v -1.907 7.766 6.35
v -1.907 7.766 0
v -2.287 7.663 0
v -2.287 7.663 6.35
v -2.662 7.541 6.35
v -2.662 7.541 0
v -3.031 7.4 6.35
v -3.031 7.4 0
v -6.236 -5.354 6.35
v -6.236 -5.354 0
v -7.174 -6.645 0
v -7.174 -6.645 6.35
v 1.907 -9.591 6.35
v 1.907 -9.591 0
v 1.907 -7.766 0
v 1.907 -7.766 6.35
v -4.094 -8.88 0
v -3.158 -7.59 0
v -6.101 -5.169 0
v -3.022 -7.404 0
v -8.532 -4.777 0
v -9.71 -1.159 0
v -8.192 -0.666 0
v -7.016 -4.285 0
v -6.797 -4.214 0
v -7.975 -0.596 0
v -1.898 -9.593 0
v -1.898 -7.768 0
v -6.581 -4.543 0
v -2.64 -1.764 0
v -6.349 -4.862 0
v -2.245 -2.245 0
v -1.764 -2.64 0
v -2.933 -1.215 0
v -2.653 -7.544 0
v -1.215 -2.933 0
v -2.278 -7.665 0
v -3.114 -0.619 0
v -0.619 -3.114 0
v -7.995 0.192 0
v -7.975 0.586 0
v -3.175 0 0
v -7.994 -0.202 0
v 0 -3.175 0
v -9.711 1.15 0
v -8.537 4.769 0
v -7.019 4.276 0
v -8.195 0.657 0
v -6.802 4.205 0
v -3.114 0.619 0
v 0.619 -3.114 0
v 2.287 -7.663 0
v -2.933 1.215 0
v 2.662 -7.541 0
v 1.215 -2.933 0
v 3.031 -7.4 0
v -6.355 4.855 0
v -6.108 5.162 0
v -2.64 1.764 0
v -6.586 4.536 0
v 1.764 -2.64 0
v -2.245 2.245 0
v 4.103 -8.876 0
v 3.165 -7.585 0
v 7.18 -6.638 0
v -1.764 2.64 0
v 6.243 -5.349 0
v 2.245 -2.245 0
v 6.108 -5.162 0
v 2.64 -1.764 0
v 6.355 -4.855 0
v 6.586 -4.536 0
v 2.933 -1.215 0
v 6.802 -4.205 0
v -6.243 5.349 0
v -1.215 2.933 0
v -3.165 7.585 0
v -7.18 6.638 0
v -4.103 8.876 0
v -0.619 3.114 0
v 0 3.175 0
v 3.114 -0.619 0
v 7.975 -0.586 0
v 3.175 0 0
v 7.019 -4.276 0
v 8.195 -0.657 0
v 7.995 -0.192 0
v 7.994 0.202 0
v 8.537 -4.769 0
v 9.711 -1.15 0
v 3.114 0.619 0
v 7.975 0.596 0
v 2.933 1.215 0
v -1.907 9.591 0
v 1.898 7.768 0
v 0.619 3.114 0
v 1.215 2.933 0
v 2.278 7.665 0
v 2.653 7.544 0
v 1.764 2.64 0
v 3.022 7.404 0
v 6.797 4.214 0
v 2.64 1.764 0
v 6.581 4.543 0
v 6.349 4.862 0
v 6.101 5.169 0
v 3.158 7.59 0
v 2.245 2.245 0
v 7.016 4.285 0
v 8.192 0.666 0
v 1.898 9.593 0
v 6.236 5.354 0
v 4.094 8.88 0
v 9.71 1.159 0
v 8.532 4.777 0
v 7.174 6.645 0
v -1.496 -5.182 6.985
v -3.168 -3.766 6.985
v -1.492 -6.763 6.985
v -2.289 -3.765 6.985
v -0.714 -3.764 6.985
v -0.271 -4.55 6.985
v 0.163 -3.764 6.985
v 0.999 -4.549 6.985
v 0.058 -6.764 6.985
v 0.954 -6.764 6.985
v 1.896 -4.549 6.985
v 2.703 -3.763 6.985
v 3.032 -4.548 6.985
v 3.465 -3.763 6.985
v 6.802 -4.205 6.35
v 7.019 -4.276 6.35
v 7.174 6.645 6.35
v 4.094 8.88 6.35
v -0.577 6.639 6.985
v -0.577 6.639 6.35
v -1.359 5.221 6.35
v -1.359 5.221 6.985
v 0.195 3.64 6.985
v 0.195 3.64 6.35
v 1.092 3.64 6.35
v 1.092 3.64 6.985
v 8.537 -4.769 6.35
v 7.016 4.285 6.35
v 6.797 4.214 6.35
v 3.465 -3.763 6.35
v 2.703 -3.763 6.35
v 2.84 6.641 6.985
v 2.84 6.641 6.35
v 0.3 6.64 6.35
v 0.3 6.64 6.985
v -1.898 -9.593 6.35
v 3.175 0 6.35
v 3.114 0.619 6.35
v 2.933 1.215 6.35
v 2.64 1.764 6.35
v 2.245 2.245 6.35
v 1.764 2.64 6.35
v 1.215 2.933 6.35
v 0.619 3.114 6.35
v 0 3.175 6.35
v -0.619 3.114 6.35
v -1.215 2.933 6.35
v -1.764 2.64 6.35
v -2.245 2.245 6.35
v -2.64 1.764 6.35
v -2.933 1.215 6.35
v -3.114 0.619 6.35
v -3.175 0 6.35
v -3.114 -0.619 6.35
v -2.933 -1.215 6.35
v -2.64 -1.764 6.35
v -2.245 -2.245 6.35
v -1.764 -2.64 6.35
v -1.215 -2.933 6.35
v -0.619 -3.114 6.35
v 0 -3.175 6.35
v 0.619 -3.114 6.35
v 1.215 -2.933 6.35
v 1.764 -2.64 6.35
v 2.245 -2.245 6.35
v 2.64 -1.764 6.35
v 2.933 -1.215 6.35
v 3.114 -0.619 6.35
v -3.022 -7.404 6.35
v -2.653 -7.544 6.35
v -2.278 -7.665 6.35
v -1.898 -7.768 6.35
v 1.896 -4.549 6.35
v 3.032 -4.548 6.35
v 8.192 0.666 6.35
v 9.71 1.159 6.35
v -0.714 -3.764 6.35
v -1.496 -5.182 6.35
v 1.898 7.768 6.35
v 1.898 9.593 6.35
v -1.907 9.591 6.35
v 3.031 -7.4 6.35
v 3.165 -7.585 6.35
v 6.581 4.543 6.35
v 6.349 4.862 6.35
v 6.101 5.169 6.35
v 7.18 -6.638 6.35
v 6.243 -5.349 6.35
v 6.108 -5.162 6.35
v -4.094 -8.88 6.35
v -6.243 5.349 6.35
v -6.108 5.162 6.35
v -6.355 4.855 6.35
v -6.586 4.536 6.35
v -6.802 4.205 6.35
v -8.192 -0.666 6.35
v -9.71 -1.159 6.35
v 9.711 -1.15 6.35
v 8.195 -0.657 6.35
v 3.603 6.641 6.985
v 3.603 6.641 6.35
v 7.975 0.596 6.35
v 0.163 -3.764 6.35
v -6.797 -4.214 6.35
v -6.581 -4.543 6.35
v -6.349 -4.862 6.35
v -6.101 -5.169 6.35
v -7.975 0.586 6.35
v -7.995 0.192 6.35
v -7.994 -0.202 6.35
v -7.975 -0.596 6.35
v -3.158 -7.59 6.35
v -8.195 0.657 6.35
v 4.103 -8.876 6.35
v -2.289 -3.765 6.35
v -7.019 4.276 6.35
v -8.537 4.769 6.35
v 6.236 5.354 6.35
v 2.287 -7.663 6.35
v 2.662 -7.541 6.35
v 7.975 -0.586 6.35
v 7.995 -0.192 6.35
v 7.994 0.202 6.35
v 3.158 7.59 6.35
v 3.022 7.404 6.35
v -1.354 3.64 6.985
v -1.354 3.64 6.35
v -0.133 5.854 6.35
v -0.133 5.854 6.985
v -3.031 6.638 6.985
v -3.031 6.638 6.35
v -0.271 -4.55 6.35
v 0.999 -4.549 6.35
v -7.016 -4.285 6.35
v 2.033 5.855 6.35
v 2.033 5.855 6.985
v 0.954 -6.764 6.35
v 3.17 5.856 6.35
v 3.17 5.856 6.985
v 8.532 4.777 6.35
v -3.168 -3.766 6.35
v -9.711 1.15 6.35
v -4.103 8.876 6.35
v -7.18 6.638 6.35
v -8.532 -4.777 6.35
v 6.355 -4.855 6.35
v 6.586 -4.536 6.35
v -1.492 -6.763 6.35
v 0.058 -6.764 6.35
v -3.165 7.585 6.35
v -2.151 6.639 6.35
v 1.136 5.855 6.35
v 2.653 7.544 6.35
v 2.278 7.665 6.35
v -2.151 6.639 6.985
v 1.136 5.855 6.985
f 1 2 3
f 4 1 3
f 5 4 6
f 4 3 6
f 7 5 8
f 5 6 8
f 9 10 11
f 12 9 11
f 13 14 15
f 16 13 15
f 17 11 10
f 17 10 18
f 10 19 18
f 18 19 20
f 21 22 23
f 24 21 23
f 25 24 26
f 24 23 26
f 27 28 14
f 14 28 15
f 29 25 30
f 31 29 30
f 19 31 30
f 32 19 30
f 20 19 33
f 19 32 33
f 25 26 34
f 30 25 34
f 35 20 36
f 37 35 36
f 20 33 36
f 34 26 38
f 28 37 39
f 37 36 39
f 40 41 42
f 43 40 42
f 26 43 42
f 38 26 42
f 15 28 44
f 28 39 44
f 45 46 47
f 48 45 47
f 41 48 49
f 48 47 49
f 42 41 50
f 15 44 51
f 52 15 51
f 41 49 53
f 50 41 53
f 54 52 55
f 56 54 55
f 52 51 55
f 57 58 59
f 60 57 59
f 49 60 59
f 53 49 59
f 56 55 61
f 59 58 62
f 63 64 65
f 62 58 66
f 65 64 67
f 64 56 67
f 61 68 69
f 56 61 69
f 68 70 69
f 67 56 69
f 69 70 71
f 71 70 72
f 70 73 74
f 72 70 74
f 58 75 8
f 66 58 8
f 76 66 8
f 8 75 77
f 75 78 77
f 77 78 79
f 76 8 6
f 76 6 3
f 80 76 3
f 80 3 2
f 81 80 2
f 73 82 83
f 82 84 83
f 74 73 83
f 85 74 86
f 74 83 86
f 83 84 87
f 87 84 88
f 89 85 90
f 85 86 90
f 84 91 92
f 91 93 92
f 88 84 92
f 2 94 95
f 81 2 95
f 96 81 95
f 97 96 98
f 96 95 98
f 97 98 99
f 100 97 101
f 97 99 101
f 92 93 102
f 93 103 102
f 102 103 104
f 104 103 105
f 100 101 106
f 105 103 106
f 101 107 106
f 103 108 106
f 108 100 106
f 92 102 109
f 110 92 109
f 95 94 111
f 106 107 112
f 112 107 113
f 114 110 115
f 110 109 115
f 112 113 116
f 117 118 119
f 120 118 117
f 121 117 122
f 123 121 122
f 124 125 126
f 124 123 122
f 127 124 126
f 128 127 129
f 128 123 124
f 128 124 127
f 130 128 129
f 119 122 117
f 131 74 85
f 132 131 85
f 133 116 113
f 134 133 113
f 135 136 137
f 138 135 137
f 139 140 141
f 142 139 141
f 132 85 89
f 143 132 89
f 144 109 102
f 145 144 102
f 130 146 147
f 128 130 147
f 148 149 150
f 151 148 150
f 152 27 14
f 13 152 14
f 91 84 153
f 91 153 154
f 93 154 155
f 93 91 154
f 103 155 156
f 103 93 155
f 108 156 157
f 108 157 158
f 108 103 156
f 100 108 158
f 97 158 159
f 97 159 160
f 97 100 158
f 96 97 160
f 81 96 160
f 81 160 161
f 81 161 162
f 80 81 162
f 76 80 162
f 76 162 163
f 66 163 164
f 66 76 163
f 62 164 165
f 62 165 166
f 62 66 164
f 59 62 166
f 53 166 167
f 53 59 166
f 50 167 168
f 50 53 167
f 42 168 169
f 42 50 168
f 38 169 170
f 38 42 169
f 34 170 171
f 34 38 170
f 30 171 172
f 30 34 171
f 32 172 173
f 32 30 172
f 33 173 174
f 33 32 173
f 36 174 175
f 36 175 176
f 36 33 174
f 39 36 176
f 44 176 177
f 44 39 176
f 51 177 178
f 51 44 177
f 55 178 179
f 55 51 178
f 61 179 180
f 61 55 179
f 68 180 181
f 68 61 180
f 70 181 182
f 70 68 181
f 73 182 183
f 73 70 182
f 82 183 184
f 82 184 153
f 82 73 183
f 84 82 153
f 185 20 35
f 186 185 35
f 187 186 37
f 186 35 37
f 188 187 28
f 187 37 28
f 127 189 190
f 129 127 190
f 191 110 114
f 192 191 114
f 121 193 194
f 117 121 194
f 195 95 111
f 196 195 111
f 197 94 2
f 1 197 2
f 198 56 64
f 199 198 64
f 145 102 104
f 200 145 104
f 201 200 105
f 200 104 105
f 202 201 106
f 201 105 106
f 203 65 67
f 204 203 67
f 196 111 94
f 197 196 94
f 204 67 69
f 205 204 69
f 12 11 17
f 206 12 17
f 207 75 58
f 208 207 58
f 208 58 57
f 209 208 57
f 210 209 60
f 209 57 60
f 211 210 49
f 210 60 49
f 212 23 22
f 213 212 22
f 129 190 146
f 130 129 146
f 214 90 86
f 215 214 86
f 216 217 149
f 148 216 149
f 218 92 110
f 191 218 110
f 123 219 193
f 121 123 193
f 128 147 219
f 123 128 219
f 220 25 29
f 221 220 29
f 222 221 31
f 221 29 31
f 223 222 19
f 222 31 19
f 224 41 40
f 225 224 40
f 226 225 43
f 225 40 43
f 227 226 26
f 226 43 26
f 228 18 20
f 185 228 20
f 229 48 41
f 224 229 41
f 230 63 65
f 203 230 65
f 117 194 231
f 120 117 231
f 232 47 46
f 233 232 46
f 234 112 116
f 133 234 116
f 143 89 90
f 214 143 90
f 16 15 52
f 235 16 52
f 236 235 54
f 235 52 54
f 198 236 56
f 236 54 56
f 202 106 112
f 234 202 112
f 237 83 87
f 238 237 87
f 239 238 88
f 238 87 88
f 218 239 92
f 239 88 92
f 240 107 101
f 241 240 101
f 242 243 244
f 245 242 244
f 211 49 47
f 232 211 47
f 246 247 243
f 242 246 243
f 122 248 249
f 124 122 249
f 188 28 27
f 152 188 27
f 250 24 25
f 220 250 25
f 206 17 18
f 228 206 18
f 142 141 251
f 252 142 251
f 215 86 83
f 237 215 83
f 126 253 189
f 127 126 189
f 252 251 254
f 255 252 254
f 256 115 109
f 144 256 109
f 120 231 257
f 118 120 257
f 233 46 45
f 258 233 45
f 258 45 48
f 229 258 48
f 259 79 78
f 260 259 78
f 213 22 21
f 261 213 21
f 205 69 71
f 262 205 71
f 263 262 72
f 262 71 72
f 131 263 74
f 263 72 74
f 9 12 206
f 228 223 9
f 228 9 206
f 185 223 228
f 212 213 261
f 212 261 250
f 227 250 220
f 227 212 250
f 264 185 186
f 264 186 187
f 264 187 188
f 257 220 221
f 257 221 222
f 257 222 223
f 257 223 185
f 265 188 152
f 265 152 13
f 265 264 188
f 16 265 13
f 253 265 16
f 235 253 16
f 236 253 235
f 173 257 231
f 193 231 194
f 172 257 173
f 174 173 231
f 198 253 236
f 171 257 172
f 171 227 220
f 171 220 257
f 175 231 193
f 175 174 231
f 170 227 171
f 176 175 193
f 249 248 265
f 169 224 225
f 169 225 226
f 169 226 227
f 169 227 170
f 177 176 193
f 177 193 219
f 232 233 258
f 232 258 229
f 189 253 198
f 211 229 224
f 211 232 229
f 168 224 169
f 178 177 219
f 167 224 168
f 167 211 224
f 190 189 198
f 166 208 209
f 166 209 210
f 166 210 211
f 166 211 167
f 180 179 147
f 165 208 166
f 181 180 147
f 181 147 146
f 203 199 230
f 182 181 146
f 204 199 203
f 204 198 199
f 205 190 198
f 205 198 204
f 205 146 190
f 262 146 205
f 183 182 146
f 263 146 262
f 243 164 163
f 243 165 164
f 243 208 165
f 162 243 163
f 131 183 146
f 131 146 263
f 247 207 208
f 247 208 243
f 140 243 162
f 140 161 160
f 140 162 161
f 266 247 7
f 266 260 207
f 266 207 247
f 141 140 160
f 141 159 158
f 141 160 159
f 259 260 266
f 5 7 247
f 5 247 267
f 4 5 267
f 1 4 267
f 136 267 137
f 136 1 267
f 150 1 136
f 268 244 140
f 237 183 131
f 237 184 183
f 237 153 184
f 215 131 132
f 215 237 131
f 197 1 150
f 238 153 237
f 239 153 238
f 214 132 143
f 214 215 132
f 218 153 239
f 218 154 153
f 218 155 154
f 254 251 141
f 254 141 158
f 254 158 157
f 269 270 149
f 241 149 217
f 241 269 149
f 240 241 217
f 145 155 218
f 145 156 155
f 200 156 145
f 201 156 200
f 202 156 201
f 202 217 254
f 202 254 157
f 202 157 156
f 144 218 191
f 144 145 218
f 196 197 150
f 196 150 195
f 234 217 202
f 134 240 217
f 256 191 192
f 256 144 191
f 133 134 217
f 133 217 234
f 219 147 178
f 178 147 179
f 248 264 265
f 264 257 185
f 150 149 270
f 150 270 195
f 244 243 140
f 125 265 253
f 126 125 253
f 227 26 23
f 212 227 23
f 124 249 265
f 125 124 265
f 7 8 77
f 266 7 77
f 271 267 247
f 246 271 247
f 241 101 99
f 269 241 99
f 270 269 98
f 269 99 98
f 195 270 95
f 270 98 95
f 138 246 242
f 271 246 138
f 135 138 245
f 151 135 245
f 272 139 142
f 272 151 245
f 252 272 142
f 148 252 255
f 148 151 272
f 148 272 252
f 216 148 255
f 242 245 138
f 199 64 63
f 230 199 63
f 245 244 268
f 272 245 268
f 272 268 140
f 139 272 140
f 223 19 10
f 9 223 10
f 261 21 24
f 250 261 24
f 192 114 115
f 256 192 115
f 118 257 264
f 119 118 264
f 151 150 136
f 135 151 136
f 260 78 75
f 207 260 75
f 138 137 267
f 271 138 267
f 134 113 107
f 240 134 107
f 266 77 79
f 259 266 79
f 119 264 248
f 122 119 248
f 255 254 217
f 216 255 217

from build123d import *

# Parameters (mm, degrees)
F0_R     = 3.175
F1_DEPTH = 6.35
F3_DEPTH = 0.635


with BuildPart() as f1:
    # F0 (on Top) → F1 (new body)
    with BuildSketch(Plane.XY):
        with BuildLine():
            Line((-6.243237, 5.348631), (-6.107624, 5.161976))
            ThreePointArc((-6.107624, 5.161976), (-6.472362, 4.696551), (-6.801712, 4.205447))
            Line((-6.801712, 4.205447), (-7.01898, 4.276041))
            Line((-7.01898, 4.276041), (-8.536659, 4.769165))
            Line((-8.536659, 4.769165), (-9.710663, 1.150007))
            Line((-9.710663, 1.150007), (-8.194731, 0.657451))
            Line((-8.194731, 0.657451), (-7.975305, 0.586155))
            ThreePointArc((-7.975305, 0.586155), (-7.996815, -0.004769), (-7.9746, -0.595668))
            Line((-7.9746, -0.595668), (-8.191868, -0.666263))
            Line((-8.191868, -0.666263), (-9.709547, -1.159387))
            Line((-9.709547, -1.159387), (-8.532048, -4.777409))
            Line((-8.532048, -4.777409), (-7.016117, -4.284853))
            Line((-7.016117, -4.284853), (-6.796691, -4.213557))
            ThreePointArc((-6.796691, -4.213557), (-6.466756, -4.704268), (-6.101462, -5.169258))
            Line((-6.101462, -5.169258), (-6.235741, -5.354077))
            Line((-6.235741, -5.354077), (-7.173718, -6.645092))
            Line((-7.173718, -6.645092), (-4.094482, -8.880017))
            Line((-4.094482, -8.880017), (-3.157584, -7.590489))
            Line((-3.157584, -7.590489), (-3.021972, -7.403834))
            ThreePointArc((-3.021972, -7.403834), (-2.466616, -7.606897), (-1.897773, -7.768367))
            Line((-1.897773, -7.768367), (-1.897773, -7.996816))
            Line((-1.897773, -7.996816), (-1.897773, -9.592598))
            Line((-1.897773, -9.592598), (1.907038, -9.590761))
            Line((1.907038, -9.590761), (1.907038, -7.996816))
            Line((1.907038, -7.996816), (1.907038, -7.766098))
            ThreePointArc((1.907038, -7.766098), (2.475688, -7.603949), (3.030801, -7.400224))
            Line((3.030801, -7.400224), (3.16508, -7.585043))
            Line((3.16508, -7.585043), (4.103057, -8.876058))
            Line((4.103057, -8.876058), (7.180134, -6.63816))
            Line((7.180134, -6.63816), (6.243237, -5.348631))
            Line((6.243237, -5.348631), (6.107624, -5.161976))
            ThreePointArc((6.107624, -5.161976), (6.472362, -4.696551), (6.801712, -4.205447))
            Line((6.801712, -4.205447), (7.01898, -4.276041))
            Line((7.01898, -4.276041), (8.536659, -4.769165))
            Line((8.536659, -4.769165), (9.710663, -1.150007))
            Line((9.710663, -1.150007), (8.194731, -0.657451))
            Line((8.194731, -0.657451), (7.975305, -0.586155))
            ThreePointArc((7.975305, -0.586155), (7.996815, 0.004769), (7.9746, 0.595668))
            Line((7.9746, 0.595668), (8.191868, 0.666263))
            Line((8.191868, 0.666263), (9.709547, 1.159387))
            Line((9.709547, 1.159387), (8.532048, 4.777409))
            Line((8.532048, 4.777409), (7.016117, 4.284853))
            Line((7.016117, 4.284853), (6.796691, 4.213557))
            ThreePointArc((6.796691, 4.213557), (6.466756, 4.704268), (6.101462, 5.169258))
            Line((6.101462, 5.169258), (6.235741, 5.354077))
            Line((6.235741, 5.354077), (7.173718, 6.645092))
            Line((7.173718, 6.645092), (4.094482, 8.880017))
            Line((4.094482, 8.880017), (3.157584, 7.590489))
            Line((3.157584, 7.590489), (3.021972, 7.403834))
            ThreePointArc((3.021972, 7.403834), (2.466616, 7.606897), (1.897773, 7.768367))
            Line((1.897773, 7.768367), (1.897773, 7.996816))
            Line((1.897773, 7.996816), (1.897773, 9.592598))
            Line((1.897773, 9.592598), (-1.907038, 9.590761))
            Line((-1.907038, 9.590761), (-1.907038, 7.996816))
            Line((-1.907038, 7.996816), (-1.907038, 7.766098))
            ThreePointArc((-1.907038, 7.766098), (-2.475688, 7.603949), (-3.030801, 7.400224))
            Line((-3.030801, 7.400224), (-3.16508, 7.585043))
            Line((-3.16508, 7.585043), (-4.103057, 8.876058))
            Line((-4.103057, 8.876058), (-7.180134, 6.63816))
            Line((-7.180134, 6.63816), (-6.243237, 5.348631))
        make_face()
        Circle(F0_R, mode=Mode.SUBTRACT)
    extrude(amount=F1_DEPTH)

    # F2 (on face) → F3 (join)
    with BuildSketch(Plane.XY.offset(6.35)):
        Polygon((-2.151463, 6.638584), (-3.030801, 6.63816), (-1.354291, 3.640304), (-0.13337, 5.854254), (1.136369, 5.854867), (0.194719, 3.640106), (1.091522, 3.640106), (2.033314, 5.855201), (3.169588, 5.85575), (3.602625, 6.640995), (2.839816, 6.640995), (0.299816, 6.639768), (-0.577028, 6.639345), (-1.358951, 5.221451), align=None)
        Polygon((-2.288674, -3.76517), (-3.168012, -3.765595), (-1.491502, -6.763451), (-0.27058, -4.549501), (0.999159, -4.548888), (0.057508, -6.763649), (0.954311, -6.763649), (1.896103, -4.548553), (3.032377, -4.548005), (3.465414, -3.76276), (2.702605, -3.76276), (0.162605, -3.763986), (-0.714239, -3.76441), (-1.496161, -5.182303), align=None)
    extrude(amount=F3_DEPTH)


solid = f1.part
